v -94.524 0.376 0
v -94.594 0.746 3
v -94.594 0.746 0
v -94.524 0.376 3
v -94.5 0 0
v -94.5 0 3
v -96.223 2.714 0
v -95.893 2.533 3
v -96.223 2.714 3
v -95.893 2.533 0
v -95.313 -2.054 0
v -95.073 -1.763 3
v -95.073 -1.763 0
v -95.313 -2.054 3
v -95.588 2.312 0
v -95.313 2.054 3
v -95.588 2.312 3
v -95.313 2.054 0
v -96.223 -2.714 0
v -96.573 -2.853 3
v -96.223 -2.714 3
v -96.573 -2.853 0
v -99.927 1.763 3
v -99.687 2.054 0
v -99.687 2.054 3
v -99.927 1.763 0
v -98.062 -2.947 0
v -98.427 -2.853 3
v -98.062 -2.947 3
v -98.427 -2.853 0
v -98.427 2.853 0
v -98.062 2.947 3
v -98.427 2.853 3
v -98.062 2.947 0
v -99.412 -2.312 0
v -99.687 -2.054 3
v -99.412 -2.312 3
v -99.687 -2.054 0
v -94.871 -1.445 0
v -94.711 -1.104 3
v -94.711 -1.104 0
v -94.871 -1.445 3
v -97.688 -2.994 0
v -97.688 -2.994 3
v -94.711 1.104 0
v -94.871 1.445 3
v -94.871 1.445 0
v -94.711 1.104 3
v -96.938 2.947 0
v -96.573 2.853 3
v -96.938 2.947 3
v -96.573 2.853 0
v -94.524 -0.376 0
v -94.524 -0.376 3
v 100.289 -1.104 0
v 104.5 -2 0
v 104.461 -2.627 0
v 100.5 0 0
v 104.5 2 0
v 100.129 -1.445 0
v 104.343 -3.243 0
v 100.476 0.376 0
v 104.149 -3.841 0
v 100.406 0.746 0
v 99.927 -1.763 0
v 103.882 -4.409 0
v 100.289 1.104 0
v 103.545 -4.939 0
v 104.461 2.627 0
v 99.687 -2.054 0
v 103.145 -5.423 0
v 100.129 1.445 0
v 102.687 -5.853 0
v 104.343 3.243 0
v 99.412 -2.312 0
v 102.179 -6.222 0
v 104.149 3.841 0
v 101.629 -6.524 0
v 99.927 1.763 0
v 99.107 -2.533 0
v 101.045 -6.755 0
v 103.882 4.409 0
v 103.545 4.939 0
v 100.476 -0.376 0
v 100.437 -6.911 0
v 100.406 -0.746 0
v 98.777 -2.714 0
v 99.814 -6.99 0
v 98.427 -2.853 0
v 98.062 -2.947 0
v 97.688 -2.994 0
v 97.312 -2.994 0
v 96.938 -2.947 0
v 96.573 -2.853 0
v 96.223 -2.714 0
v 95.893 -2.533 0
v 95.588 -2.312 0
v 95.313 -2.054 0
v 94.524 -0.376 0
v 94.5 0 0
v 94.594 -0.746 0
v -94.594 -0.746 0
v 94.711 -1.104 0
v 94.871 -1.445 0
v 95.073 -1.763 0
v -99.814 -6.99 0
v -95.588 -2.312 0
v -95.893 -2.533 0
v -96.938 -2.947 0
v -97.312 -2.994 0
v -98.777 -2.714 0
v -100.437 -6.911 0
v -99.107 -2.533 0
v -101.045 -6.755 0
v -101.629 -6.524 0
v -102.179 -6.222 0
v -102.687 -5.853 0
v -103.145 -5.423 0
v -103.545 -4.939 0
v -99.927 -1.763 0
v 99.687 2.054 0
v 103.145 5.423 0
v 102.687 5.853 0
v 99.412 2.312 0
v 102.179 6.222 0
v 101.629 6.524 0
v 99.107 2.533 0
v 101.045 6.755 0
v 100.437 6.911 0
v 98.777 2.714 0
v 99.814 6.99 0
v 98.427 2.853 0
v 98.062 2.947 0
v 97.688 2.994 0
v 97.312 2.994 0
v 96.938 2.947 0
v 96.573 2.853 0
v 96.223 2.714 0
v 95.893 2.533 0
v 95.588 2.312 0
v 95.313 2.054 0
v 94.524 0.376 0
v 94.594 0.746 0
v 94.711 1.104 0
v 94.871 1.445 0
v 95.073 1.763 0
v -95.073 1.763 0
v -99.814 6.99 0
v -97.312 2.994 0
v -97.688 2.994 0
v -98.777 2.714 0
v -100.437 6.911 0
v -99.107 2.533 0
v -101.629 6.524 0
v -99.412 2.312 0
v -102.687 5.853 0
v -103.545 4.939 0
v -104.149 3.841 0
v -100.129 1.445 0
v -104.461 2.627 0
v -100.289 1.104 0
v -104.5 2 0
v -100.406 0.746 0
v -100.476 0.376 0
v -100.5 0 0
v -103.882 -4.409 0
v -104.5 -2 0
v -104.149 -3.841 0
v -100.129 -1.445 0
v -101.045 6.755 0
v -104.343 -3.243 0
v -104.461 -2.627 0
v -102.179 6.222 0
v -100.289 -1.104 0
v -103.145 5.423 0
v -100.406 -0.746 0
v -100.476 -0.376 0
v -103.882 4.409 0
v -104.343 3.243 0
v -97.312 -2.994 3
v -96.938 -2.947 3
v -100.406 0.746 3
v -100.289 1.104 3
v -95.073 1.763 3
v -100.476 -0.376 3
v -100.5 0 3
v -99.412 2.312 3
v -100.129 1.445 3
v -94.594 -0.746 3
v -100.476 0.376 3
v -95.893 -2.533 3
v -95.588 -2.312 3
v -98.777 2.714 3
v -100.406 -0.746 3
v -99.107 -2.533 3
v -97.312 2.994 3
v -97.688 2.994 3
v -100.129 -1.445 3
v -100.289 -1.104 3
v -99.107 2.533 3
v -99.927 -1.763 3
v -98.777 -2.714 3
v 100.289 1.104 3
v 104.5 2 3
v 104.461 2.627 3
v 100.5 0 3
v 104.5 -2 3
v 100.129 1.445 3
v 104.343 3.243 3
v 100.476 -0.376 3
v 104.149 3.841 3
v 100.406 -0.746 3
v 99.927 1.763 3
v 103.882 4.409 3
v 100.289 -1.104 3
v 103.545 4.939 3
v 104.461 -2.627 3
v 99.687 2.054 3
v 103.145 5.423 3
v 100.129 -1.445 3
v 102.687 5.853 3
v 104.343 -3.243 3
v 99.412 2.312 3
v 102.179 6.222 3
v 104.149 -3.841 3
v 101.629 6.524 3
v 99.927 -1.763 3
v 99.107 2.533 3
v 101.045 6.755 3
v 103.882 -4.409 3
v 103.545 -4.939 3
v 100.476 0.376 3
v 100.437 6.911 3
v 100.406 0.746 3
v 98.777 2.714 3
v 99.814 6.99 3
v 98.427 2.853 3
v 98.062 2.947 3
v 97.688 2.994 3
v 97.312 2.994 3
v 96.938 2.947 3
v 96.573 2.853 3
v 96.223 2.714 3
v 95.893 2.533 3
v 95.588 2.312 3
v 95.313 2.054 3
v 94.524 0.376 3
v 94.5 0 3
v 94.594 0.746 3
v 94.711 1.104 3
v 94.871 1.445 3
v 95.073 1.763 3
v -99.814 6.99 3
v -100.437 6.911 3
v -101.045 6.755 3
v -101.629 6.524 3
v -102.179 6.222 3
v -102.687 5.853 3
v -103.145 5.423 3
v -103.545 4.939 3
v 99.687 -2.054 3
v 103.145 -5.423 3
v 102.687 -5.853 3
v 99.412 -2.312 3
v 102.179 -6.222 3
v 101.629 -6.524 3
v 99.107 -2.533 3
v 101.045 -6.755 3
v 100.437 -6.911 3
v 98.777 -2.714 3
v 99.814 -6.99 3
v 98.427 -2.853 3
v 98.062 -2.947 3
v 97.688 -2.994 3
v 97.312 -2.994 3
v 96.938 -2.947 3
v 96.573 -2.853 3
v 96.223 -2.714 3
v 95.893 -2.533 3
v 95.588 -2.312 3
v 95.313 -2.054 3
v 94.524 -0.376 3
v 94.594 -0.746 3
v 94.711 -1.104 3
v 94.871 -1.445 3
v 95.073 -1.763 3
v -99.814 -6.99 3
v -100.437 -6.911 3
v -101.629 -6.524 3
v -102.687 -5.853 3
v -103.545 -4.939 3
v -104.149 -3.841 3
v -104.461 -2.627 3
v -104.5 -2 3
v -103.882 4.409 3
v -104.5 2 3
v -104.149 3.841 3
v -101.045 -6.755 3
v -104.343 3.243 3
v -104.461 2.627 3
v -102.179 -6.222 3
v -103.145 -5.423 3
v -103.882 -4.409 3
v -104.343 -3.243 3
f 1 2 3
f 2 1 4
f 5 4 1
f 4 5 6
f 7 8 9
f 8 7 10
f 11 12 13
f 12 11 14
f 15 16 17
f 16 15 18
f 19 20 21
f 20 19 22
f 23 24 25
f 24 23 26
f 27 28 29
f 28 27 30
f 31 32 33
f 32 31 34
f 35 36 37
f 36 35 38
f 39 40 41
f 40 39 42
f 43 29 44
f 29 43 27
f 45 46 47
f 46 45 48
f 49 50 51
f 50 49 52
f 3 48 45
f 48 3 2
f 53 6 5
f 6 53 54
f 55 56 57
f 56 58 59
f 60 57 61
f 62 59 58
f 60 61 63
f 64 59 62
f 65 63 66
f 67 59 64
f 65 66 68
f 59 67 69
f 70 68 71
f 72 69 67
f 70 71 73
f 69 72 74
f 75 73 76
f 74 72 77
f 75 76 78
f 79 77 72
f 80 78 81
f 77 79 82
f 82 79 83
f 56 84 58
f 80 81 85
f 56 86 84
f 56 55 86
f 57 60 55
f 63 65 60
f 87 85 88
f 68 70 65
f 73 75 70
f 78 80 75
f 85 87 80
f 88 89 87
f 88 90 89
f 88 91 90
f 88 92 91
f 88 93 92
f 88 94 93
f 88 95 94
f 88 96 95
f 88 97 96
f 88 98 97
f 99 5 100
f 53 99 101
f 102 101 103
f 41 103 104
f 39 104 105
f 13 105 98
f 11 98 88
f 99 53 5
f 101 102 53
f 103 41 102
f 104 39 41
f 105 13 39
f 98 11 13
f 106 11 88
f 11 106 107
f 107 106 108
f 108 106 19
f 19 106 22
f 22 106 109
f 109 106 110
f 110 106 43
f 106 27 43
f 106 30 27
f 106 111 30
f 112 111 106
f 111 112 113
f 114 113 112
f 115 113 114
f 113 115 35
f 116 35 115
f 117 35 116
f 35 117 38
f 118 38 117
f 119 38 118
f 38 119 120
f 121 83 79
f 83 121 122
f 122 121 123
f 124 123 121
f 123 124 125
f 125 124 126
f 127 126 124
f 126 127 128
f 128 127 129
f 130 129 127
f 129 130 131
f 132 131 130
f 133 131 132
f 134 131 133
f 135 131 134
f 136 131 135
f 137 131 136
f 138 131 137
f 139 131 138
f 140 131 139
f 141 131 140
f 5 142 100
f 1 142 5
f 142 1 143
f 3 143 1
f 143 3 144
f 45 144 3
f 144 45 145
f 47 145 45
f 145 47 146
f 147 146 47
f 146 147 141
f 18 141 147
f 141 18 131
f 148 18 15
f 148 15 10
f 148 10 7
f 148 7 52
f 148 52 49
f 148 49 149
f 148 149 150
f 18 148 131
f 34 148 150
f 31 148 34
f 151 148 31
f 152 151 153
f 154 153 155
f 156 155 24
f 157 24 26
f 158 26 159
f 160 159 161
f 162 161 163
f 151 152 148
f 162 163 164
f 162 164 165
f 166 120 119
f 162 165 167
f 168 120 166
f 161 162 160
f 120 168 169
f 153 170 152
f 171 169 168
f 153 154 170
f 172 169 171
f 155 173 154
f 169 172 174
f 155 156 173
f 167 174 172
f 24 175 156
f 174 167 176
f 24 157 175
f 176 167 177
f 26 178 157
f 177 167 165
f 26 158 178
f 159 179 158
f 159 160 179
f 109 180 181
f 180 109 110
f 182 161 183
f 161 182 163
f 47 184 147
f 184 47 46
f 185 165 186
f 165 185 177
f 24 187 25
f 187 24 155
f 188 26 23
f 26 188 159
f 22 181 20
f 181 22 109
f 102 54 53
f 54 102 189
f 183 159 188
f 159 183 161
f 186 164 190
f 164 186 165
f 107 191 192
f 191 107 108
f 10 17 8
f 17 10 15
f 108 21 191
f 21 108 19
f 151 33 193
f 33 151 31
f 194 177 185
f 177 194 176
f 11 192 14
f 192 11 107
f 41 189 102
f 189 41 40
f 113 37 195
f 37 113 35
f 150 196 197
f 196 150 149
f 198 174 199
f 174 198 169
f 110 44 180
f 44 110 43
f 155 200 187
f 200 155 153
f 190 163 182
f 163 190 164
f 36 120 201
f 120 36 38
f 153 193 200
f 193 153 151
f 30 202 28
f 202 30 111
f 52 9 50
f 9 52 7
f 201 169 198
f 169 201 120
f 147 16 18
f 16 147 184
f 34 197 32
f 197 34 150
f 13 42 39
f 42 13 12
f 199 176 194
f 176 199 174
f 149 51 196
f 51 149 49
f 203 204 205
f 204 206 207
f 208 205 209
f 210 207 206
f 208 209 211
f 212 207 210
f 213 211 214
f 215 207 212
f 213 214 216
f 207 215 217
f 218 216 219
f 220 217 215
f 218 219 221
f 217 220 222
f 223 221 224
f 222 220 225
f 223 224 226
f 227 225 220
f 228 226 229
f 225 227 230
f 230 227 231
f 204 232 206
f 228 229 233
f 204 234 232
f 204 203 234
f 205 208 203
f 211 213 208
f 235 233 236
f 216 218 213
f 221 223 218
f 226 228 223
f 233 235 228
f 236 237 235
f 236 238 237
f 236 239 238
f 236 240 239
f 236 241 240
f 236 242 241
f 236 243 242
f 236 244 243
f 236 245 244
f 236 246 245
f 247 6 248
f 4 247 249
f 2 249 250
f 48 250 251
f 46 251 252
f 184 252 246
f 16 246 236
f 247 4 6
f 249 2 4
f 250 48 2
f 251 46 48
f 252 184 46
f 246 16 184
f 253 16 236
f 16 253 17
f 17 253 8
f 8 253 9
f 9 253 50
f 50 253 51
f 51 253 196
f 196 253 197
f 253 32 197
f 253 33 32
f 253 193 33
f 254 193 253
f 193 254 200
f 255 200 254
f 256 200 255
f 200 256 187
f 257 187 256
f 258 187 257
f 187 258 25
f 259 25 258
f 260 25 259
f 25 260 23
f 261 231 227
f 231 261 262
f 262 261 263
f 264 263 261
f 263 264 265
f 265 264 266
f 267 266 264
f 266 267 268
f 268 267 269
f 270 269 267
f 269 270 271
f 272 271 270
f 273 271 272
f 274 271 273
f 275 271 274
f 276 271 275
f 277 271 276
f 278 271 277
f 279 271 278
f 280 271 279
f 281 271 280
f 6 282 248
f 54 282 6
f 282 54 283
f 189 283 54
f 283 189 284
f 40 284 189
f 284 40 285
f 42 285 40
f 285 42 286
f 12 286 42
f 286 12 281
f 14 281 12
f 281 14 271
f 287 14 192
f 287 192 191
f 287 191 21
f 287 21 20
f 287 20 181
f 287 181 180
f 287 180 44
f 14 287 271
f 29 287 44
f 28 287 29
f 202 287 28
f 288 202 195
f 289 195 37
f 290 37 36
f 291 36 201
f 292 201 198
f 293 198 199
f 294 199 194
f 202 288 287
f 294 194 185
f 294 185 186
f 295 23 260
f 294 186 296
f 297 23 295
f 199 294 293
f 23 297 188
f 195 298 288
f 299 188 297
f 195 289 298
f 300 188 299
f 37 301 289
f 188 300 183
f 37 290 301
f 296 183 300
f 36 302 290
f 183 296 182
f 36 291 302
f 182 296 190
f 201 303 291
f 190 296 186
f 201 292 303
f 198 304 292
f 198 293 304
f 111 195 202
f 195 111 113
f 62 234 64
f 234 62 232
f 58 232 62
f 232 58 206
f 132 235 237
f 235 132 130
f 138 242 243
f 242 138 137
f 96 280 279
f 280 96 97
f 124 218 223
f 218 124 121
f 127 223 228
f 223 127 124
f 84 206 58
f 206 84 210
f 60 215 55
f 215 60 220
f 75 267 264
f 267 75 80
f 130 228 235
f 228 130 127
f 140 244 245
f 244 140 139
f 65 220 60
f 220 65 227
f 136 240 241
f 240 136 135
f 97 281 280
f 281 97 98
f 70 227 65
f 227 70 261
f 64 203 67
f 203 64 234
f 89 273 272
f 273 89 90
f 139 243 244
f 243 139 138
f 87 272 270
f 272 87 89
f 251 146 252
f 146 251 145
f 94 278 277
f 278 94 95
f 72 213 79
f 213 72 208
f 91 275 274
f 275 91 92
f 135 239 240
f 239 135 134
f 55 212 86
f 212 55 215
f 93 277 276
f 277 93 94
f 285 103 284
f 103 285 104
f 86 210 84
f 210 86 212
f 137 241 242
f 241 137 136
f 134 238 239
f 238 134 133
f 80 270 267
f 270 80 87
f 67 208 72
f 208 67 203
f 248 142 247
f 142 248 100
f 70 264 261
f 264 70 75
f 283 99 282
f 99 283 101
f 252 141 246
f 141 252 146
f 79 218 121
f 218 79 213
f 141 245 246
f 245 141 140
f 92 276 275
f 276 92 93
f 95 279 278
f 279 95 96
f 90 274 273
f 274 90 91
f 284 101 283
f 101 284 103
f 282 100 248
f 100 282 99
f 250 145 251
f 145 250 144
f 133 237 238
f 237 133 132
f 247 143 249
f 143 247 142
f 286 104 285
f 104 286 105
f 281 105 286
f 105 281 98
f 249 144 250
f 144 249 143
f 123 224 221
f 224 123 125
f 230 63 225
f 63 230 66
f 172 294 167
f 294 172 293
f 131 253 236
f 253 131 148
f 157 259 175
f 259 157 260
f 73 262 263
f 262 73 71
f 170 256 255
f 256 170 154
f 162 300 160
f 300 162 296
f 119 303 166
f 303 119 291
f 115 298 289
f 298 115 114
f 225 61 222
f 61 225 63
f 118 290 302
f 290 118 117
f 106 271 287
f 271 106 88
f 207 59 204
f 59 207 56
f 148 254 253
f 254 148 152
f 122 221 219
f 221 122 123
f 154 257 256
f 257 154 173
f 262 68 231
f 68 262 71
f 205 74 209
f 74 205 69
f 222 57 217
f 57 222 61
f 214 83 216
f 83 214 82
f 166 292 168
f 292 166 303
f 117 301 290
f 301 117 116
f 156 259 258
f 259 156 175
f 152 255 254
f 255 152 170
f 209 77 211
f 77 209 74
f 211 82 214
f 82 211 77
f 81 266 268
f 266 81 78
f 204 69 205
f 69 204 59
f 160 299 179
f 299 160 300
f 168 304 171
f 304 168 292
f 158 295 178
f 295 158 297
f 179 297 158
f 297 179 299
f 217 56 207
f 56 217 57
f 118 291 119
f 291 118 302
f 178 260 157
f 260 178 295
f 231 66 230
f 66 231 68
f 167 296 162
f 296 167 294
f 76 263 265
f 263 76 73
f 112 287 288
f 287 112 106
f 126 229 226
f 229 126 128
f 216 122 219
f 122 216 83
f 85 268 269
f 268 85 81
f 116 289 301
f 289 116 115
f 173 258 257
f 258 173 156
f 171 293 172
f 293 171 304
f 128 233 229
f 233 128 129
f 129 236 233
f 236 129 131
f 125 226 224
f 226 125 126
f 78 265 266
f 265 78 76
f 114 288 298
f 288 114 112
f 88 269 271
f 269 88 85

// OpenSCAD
$fn = 50;


difference() {
	union() {
		hull() {
			translate(v = [-99.5000000000, 2.0000000000, 0]) {
				cylinder(h = 3, r = 5);
			}
			translate(v = [99.5000000000, 2.0000000000, 0]) {
				cylinder(h = 3, r = 5);
			}
			translate(v = [-99.5000000000, -2.0000000000, 0]) {
				cylinder(h = 3, r = 5);
			}
			translate(v = [99.5000000000, -2.0000000000, 0]) {
				cylinder(h = 3, r = 5);
			}
		}
	}
	union() {
		translate(v = [-97.5000000000, 0.0000000000, 0]) {
			cylinder(h = 3, r = 3.0000000000);
		}
		translate(v = [97.5000000000, 0.0000000000, 0]) {
			cylinder(h = 3, r = 3.0000000000);
		}
		translate(v = [-97.5000000000, 0.0000000000, 0]) {
			cylinder(h = 3, r = 1.5000000000);
		}
		translate(v = [97.5000000000, 0.0000000000, 0]) {
			cylinder(h = 3, r = 1.5000000000);
		}
		translate(v = [-97.5000000000, 0.0000000000, 0]) {
			cylinder(h = 3, r = 1.5000000000);
		}
		translate(v = [97.5000000000, 0.0000000000, 0]) {
			cylinder(h = 3, r = 1.5000000000);
		}
		translate(v = [-97.5000000000, 0.0000000000, 0]) {
			cylinder(h = 3, r = 1.5000000000);
		}
		translate(v = [97.5000000000, 0.0000000000, 0]) {
			cylinder(h = 3, r = 1.5000000000);
		}
	}
}
